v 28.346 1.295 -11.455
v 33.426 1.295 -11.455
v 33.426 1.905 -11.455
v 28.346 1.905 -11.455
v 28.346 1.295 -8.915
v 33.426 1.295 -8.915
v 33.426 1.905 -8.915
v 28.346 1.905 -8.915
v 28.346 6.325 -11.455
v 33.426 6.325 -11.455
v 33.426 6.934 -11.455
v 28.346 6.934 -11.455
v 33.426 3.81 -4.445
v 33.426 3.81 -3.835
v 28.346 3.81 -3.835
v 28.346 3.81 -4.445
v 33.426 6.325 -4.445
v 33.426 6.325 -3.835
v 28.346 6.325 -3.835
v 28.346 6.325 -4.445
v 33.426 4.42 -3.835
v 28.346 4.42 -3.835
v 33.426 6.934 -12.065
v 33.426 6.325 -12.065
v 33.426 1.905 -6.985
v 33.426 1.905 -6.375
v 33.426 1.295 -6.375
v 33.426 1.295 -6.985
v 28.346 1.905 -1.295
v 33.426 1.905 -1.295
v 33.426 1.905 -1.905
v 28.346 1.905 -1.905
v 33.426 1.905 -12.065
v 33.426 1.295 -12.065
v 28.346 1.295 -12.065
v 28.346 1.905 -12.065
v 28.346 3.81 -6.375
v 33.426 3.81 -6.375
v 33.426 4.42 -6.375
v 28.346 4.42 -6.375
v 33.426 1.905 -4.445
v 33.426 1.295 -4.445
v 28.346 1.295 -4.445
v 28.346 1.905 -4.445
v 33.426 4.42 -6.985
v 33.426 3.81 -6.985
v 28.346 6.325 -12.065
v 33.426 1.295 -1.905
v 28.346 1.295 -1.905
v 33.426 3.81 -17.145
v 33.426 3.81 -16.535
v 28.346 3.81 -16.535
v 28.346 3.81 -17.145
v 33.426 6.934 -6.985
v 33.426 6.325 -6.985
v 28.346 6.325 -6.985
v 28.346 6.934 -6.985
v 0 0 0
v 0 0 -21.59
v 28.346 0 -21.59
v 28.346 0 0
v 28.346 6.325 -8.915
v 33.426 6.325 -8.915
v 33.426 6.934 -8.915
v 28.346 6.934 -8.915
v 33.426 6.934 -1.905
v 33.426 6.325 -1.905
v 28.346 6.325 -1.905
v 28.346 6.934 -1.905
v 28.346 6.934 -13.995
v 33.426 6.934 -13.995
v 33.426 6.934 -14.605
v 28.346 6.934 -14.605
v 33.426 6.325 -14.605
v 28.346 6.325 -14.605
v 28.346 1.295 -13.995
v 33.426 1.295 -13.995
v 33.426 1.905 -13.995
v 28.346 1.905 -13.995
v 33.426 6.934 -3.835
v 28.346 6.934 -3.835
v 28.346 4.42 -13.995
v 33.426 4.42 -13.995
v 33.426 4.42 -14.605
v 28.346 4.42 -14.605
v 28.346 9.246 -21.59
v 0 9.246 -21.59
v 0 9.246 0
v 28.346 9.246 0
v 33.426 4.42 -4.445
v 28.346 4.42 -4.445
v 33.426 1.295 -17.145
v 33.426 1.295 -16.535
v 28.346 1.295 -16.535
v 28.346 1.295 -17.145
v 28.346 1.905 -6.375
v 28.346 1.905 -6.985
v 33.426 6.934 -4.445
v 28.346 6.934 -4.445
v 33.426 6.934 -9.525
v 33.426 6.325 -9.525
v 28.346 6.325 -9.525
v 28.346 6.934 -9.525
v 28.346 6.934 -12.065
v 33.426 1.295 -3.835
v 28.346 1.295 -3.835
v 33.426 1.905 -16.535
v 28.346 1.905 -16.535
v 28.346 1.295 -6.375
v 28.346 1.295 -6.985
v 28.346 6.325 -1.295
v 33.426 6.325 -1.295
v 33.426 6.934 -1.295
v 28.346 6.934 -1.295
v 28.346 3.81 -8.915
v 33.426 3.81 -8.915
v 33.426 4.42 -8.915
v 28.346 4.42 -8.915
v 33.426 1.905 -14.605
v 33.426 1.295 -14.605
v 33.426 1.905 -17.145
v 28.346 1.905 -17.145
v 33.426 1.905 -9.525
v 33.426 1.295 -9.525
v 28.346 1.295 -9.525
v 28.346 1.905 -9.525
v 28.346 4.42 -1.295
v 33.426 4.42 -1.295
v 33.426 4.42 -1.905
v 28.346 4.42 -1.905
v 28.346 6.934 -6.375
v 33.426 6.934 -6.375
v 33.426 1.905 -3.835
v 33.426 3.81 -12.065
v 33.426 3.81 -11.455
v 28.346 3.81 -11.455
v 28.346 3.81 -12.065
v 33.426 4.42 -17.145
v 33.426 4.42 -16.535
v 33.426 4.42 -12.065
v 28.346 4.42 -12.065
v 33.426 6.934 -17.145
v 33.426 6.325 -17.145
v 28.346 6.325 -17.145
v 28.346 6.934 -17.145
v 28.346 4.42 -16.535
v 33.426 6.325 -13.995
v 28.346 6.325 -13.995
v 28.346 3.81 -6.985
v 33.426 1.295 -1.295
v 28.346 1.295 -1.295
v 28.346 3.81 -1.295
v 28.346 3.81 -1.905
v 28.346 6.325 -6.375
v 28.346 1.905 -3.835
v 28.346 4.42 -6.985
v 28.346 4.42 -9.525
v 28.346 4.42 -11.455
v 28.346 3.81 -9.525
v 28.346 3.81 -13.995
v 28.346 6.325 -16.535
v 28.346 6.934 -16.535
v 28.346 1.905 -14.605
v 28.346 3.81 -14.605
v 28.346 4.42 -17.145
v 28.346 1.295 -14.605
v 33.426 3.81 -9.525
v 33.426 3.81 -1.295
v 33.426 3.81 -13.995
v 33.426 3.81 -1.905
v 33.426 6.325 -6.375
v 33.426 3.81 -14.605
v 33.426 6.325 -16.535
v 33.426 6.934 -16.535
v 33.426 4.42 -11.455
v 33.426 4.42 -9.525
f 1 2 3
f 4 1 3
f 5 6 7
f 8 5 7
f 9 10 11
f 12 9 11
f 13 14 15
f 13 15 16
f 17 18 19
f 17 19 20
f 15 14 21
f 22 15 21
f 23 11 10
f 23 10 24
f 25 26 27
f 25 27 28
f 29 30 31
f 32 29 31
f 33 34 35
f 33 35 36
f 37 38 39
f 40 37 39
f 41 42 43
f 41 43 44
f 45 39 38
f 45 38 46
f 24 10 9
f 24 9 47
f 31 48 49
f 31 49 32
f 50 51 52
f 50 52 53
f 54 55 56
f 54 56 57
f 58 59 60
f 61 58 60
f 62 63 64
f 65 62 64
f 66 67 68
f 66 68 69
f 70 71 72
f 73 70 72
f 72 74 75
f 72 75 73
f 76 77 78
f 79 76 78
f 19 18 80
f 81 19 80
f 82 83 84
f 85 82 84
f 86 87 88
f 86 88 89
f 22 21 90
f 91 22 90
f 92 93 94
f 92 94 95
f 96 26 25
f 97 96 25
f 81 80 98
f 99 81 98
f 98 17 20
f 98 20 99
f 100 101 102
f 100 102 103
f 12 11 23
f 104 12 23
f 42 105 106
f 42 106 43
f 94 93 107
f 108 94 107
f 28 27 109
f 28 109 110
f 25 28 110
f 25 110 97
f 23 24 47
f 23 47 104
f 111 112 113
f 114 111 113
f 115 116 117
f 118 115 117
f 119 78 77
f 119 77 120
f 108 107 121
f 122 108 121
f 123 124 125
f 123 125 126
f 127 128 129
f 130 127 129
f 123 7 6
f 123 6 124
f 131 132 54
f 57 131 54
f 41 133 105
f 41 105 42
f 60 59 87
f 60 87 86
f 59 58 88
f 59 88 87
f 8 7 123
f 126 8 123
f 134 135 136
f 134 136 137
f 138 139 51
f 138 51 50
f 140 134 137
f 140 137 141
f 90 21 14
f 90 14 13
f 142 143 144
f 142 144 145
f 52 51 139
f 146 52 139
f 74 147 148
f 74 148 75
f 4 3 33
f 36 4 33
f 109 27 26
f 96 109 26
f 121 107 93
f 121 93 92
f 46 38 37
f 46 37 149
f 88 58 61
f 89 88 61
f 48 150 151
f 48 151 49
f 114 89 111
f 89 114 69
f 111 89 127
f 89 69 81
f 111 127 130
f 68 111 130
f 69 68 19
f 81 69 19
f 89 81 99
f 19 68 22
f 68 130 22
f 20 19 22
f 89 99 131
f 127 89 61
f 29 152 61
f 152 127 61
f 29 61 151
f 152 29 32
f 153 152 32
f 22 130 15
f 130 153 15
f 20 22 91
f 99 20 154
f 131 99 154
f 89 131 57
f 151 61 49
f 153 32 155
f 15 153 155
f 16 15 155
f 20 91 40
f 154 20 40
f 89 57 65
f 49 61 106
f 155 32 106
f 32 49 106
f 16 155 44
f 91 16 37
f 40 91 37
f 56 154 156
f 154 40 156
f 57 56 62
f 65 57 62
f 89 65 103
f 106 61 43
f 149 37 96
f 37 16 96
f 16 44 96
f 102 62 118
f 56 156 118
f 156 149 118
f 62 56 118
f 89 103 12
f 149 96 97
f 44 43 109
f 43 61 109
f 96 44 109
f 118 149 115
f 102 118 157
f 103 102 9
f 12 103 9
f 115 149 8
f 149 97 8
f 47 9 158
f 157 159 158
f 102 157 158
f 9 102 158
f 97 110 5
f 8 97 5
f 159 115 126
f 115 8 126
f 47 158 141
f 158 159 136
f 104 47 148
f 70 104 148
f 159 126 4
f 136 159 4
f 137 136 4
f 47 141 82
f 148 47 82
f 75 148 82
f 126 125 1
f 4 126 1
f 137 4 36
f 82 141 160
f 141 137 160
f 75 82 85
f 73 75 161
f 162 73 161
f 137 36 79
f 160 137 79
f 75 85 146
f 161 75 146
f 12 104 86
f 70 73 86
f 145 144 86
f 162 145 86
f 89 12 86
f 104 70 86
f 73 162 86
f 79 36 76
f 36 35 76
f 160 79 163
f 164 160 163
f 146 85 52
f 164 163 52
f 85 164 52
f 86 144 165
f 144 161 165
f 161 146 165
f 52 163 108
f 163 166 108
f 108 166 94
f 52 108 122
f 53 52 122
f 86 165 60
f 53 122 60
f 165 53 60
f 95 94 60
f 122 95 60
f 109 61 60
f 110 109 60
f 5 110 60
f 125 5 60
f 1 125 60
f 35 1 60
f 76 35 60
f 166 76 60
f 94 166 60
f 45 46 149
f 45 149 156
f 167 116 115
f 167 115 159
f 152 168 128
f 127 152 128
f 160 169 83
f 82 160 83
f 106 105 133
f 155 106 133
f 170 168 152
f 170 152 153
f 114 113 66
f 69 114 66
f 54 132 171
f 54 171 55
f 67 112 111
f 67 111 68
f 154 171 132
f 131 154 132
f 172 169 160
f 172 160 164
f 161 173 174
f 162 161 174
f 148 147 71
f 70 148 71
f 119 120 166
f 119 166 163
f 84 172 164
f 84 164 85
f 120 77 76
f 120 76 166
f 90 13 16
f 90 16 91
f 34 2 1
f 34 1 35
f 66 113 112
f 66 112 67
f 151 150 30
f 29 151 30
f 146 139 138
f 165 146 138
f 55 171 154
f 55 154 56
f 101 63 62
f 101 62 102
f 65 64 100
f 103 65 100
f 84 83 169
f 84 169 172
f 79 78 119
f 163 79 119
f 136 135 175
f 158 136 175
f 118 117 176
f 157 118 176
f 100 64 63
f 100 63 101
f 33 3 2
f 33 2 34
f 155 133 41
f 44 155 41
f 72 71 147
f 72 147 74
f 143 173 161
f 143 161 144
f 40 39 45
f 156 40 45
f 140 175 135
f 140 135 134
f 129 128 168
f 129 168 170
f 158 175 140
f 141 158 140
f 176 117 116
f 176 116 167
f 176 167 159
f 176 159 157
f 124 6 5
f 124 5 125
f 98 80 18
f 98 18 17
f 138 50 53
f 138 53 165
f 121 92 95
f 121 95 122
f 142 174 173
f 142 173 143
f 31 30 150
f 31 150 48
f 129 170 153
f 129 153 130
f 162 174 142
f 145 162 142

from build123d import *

# Parameters (mm, degrees)
SKETCH1_W           = 28.3464
SKETCH1_H           = 21.59
BOSS_EXTRUDE1_DEPTH = 9.2456
SKETCH2_W           = 0.6096
SKETCH2_H           = 0.6096
BOSS_EXTRUDE2_DEPTH = 5.08
LPATTERN1_COUNT     = 7
LPATTERN1_PITCH     = 2.54


with BuildPart() as part:
    # Sketch1 → Boss-Extrude1 (new body)
    with BuildSketch(Plane(origin=(0, 0, 0), x_dir=(1, 0, 0), z_dir=(0, 1, 0))):
        with Locations((14.1732, 10.795)):
            Rectangle(SKETCH1_W, SKETCH1_H)
    extrude(amount=BOSS_EXTRUDE1_DEPTH)

    # Sketch2 → Boss-Extrude2 (add)
    with BuildSketch(Plane(origin=(28.3464, 0, 0), x_dir=(0, 0, -1), z_dir=(1, 0, 0))):
        with Locations((1.6002, 6.6294)):
            Rectangle(SKETCH2_W, SKETCH2_H)
        with Locations((1.6002, 1.6002)):
            Rectangle(SKETCH2_W, SKETCH2_H)
        with Locations((1.6002, 4.1148)):
            Rectangle(SKETCH2_W, SKETCH2_H)
    boss_extrude2 = extrude(amount=BOSS_EXTRUDE2_DEPTH)

    # LPattern1: Boss-Extrude2 ×7
    with Locations(*[(0, 0, -i * LPATTERN1_PITCH) for i in range(1, LPATTERN1_COUNT)]):
        add(boss_extrude2)


solid = part.part
